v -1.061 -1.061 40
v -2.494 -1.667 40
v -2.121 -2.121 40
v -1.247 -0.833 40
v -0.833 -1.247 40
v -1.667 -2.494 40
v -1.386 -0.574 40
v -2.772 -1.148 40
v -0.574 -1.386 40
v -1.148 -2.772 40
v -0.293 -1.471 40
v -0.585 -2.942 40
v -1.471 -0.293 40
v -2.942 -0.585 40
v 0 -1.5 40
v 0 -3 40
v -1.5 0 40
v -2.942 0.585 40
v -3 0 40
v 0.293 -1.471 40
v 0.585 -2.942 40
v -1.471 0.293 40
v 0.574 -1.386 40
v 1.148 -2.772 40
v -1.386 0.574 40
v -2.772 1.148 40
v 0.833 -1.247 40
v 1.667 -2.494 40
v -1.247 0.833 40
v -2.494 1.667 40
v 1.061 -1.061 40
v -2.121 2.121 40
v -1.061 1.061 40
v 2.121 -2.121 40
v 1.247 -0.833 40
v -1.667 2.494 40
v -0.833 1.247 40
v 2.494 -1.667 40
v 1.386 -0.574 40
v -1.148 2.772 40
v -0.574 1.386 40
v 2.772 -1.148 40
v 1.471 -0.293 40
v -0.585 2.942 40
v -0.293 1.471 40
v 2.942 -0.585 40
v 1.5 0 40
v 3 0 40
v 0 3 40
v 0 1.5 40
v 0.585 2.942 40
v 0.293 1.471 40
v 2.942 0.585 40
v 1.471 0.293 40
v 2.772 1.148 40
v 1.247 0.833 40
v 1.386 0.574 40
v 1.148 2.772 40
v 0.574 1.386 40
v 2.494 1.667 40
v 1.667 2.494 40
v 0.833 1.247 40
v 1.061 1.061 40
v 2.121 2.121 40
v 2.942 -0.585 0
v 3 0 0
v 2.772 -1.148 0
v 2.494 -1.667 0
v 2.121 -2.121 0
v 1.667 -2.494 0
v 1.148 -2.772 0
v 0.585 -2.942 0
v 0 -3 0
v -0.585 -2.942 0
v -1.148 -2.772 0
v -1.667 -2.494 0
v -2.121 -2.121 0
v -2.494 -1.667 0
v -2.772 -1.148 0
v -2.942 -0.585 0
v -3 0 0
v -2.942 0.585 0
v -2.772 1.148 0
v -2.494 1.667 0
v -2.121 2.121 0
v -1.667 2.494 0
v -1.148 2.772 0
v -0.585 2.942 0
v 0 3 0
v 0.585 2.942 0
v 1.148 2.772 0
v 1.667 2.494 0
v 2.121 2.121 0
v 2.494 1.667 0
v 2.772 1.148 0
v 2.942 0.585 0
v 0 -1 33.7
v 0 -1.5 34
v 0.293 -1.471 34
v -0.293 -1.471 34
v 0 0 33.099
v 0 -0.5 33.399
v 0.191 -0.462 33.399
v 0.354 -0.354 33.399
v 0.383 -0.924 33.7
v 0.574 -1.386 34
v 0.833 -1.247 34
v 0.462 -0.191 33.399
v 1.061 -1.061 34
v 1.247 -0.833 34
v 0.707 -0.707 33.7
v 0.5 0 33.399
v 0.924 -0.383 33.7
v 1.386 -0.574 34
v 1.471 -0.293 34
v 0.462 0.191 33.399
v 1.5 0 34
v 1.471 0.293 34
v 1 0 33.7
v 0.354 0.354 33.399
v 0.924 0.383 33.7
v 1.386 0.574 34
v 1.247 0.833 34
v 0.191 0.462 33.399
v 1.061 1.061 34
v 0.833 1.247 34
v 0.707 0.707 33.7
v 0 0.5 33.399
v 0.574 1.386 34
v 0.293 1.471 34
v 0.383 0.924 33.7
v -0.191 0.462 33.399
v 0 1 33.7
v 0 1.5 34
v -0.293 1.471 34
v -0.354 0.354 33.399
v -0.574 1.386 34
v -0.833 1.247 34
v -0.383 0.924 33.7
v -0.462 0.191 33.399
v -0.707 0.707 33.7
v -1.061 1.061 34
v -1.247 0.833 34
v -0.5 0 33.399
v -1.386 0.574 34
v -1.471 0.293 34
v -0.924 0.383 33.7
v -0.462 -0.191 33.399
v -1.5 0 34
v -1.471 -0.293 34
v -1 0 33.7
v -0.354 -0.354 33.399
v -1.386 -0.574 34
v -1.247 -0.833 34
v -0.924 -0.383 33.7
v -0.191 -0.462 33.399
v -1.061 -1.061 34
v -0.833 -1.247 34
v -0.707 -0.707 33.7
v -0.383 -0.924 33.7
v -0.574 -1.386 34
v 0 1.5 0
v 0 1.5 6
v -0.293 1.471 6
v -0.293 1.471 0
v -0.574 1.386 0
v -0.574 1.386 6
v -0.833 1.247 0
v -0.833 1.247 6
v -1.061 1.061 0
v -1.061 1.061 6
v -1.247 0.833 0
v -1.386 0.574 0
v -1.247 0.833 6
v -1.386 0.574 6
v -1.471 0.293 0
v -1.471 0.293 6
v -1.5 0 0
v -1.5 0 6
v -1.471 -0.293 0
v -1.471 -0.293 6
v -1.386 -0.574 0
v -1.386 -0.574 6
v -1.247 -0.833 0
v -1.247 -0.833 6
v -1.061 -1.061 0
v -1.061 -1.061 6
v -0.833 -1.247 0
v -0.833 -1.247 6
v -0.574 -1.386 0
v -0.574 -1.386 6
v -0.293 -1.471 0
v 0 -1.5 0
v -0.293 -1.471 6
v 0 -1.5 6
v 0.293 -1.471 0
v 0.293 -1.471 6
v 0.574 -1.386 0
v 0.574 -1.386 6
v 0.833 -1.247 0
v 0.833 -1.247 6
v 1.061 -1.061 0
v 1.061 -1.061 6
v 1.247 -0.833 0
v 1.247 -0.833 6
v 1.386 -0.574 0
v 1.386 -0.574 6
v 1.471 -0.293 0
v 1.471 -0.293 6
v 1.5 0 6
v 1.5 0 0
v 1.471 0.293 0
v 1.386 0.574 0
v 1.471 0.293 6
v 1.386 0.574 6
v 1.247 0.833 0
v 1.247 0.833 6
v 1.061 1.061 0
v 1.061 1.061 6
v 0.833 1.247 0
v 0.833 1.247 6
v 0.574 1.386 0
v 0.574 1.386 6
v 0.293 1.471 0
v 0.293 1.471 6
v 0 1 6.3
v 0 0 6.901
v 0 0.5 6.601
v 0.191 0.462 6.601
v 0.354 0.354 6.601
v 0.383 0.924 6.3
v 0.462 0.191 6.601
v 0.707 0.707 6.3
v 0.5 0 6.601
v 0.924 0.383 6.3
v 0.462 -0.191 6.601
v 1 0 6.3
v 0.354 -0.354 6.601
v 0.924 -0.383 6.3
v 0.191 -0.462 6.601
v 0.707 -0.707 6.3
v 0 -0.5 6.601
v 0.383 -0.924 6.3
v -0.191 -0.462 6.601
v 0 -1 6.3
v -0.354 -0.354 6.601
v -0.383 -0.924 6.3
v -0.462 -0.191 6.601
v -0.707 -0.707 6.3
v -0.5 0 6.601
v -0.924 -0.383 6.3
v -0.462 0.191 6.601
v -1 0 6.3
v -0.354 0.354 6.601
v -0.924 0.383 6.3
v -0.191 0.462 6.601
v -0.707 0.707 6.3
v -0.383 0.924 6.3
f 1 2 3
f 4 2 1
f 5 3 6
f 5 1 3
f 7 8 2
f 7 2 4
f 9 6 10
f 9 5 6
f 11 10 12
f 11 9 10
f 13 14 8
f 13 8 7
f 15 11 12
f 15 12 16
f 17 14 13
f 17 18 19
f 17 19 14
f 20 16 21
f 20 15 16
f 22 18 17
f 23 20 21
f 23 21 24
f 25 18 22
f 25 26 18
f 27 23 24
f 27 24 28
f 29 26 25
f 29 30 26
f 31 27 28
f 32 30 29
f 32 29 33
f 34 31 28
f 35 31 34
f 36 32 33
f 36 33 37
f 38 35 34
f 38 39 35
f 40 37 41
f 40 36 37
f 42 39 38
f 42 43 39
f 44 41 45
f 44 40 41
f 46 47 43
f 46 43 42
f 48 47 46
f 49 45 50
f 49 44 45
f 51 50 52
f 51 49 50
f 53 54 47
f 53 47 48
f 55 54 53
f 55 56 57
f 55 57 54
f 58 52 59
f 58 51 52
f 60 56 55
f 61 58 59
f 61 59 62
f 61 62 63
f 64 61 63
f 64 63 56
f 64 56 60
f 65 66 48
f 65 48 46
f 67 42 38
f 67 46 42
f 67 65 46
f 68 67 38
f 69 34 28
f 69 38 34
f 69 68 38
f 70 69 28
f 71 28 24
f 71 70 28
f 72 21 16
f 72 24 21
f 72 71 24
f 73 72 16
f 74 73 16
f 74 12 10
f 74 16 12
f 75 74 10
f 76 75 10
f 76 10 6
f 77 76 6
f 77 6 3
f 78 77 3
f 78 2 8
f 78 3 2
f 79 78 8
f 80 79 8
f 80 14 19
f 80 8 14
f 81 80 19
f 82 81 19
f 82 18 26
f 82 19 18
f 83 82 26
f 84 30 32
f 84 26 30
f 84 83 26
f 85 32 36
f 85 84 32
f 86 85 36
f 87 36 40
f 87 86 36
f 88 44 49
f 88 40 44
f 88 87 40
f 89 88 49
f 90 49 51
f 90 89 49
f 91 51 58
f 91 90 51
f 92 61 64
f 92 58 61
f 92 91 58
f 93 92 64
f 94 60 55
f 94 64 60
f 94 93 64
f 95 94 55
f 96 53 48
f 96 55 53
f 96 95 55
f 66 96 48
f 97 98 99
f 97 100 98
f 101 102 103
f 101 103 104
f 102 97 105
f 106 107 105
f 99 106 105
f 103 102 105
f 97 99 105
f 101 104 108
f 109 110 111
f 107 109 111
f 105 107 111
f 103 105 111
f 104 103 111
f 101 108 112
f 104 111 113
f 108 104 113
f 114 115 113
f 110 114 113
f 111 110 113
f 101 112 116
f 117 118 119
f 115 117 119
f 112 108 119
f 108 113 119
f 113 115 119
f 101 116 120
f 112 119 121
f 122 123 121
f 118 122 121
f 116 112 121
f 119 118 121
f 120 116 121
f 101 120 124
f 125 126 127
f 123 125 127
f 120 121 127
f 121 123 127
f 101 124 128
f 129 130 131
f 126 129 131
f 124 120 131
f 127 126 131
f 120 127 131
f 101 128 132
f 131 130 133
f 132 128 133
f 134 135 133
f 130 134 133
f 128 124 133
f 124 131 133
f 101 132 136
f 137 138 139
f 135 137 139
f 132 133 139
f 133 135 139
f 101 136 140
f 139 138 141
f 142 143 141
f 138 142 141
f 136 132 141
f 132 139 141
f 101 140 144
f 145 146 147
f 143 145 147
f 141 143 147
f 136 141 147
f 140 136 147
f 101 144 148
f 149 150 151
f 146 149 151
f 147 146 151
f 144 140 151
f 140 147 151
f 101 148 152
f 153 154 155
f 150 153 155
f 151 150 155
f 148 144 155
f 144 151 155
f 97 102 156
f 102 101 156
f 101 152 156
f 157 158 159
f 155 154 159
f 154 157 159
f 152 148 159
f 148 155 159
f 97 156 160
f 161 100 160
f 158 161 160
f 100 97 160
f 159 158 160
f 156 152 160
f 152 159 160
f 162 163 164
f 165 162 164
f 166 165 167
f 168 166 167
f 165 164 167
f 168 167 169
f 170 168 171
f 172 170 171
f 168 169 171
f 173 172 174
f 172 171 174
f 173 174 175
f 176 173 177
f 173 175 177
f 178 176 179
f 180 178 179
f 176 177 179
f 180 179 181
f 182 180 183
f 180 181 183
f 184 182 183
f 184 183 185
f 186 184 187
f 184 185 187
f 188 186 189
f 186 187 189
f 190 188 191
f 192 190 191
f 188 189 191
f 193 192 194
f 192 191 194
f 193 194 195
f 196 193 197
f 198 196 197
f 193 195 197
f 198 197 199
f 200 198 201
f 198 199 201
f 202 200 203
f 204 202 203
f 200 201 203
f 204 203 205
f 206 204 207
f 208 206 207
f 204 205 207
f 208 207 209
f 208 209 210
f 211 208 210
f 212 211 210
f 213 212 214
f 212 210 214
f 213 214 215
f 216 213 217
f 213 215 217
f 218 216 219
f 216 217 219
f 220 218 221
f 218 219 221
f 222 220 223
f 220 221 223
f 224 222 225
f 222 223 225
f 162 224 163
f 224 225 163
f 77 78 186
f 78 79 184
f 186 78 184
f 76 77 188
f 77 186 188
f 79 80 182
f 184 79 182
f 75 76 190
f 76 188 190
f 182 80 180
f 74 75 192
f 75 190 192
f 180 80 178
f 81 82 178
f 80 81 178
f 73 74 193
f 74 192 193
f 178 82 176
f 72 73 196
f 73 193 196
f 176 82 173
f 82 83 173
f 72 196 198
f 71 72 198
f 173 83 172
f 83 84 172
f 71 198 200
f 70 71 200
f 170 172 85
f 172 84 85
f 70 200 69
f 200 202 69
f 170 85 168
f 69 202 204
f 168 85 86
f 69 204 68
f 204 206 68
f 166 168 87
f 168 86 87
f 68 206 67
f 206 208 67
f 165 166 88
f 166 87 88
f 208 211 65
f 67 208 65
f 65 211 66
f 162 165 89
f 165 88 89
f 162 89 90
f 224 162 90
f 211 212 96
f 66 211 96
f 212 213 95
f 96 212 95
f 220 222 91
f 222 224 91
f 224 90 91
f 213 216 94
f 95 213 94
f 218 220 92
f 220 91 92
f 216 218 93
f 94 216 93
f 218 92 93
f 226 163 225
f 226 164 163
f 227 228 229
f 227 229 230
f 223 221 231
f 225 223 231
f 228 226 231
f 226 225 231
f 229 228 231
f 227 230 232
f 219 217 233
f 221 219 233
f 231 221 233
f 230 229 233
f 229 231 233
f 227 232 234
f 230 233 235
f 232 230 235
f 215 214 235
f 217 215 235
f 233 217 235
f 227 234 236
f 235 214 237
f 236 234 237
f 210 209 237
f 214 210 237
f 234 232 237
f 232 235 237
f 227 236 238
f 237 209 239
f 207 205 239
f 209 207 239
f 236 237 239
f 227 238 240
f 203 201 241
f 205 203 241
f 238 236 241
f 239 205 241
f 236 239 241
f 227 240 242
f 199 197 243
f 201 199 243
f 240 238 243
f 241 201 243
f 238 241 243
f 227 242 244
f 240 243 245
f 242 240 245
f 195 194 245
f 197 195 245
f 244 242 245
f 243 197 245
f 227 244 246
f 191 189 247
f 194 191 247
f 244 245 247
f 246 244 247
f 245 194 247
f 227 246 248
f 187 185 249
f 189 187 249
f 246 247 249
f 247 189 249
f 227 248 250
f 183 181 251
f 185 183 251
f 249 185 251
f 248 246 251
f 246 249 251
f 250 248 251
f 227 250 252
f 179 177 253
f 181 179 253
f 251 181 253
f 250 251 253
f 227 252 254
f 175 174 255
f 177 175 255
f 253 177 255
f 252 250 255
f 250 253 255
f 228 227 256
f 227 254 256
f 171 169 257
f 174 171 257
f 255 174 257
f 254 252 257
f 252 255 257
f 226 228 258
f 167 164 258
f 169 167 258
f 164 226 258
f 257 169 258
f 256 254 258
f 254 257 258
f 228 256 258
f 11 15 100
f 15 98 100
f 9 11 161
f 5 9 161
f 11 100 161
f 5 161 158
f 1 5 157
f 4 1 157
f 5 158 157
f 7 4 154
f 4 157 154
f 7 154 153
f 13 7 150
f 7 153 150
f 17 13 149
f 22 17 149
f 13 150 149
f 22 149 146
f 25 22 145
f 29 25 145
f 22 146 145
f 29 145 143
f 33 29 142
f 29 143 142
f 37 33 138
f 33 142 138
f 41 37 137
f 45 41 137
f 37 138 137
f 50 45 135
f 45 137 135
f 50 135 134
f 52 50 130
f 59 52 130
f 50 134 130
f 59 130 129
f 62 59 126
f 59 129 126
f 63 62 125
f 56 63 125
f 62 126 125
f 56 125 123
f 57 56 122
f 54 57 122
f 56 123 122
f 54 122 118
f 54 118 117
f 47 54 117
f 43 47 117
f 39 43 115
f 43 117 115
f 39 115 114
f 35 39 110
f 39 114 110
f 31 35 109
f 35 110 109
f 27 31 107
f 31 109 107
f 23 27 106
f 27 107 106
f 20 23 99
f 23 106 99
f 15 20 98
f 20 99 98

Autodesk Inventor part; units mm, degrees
ref_plane "YZ Plane" through (0, 0, 0) normal (1, 0, 0) x (0, 1, 0)
ref_plane "XZ Plane" through (0, 0, 0) normal (0, 1, 0) x (-1, 0, 0)
ref_plane "XY Plane" through (0, 0, 0) normal (0, 0, 1) x (1, 0, 0)
sketch "スケッチ1" plane through (0, 0, 0) normal (0, 0, 1) x (1, 0, 0)
  circle A0 centre (0, 0) radius 3
  dimension "d0" = 6
extrude "押し出し1" add sketch "スケッチ1" along normal blind 40
hole "穴1" at (0, 0, 0) direction (0, 0, 1) diameter 3 depth 6 tip angle 118
sketch "スケッチ2" plane through (0, 0, 40) normal (0, 0, 1) x (1, 0, 0)
  circle A0 centre (0, 0) radius 3 projected
hole "穴2" at (0, 0, 40) direction (0, 0, -1) diameter 3 depth 6 tip angle 118
properties part number "スペーサ　m3-l40" material "アルミニウム 2014-T4"
